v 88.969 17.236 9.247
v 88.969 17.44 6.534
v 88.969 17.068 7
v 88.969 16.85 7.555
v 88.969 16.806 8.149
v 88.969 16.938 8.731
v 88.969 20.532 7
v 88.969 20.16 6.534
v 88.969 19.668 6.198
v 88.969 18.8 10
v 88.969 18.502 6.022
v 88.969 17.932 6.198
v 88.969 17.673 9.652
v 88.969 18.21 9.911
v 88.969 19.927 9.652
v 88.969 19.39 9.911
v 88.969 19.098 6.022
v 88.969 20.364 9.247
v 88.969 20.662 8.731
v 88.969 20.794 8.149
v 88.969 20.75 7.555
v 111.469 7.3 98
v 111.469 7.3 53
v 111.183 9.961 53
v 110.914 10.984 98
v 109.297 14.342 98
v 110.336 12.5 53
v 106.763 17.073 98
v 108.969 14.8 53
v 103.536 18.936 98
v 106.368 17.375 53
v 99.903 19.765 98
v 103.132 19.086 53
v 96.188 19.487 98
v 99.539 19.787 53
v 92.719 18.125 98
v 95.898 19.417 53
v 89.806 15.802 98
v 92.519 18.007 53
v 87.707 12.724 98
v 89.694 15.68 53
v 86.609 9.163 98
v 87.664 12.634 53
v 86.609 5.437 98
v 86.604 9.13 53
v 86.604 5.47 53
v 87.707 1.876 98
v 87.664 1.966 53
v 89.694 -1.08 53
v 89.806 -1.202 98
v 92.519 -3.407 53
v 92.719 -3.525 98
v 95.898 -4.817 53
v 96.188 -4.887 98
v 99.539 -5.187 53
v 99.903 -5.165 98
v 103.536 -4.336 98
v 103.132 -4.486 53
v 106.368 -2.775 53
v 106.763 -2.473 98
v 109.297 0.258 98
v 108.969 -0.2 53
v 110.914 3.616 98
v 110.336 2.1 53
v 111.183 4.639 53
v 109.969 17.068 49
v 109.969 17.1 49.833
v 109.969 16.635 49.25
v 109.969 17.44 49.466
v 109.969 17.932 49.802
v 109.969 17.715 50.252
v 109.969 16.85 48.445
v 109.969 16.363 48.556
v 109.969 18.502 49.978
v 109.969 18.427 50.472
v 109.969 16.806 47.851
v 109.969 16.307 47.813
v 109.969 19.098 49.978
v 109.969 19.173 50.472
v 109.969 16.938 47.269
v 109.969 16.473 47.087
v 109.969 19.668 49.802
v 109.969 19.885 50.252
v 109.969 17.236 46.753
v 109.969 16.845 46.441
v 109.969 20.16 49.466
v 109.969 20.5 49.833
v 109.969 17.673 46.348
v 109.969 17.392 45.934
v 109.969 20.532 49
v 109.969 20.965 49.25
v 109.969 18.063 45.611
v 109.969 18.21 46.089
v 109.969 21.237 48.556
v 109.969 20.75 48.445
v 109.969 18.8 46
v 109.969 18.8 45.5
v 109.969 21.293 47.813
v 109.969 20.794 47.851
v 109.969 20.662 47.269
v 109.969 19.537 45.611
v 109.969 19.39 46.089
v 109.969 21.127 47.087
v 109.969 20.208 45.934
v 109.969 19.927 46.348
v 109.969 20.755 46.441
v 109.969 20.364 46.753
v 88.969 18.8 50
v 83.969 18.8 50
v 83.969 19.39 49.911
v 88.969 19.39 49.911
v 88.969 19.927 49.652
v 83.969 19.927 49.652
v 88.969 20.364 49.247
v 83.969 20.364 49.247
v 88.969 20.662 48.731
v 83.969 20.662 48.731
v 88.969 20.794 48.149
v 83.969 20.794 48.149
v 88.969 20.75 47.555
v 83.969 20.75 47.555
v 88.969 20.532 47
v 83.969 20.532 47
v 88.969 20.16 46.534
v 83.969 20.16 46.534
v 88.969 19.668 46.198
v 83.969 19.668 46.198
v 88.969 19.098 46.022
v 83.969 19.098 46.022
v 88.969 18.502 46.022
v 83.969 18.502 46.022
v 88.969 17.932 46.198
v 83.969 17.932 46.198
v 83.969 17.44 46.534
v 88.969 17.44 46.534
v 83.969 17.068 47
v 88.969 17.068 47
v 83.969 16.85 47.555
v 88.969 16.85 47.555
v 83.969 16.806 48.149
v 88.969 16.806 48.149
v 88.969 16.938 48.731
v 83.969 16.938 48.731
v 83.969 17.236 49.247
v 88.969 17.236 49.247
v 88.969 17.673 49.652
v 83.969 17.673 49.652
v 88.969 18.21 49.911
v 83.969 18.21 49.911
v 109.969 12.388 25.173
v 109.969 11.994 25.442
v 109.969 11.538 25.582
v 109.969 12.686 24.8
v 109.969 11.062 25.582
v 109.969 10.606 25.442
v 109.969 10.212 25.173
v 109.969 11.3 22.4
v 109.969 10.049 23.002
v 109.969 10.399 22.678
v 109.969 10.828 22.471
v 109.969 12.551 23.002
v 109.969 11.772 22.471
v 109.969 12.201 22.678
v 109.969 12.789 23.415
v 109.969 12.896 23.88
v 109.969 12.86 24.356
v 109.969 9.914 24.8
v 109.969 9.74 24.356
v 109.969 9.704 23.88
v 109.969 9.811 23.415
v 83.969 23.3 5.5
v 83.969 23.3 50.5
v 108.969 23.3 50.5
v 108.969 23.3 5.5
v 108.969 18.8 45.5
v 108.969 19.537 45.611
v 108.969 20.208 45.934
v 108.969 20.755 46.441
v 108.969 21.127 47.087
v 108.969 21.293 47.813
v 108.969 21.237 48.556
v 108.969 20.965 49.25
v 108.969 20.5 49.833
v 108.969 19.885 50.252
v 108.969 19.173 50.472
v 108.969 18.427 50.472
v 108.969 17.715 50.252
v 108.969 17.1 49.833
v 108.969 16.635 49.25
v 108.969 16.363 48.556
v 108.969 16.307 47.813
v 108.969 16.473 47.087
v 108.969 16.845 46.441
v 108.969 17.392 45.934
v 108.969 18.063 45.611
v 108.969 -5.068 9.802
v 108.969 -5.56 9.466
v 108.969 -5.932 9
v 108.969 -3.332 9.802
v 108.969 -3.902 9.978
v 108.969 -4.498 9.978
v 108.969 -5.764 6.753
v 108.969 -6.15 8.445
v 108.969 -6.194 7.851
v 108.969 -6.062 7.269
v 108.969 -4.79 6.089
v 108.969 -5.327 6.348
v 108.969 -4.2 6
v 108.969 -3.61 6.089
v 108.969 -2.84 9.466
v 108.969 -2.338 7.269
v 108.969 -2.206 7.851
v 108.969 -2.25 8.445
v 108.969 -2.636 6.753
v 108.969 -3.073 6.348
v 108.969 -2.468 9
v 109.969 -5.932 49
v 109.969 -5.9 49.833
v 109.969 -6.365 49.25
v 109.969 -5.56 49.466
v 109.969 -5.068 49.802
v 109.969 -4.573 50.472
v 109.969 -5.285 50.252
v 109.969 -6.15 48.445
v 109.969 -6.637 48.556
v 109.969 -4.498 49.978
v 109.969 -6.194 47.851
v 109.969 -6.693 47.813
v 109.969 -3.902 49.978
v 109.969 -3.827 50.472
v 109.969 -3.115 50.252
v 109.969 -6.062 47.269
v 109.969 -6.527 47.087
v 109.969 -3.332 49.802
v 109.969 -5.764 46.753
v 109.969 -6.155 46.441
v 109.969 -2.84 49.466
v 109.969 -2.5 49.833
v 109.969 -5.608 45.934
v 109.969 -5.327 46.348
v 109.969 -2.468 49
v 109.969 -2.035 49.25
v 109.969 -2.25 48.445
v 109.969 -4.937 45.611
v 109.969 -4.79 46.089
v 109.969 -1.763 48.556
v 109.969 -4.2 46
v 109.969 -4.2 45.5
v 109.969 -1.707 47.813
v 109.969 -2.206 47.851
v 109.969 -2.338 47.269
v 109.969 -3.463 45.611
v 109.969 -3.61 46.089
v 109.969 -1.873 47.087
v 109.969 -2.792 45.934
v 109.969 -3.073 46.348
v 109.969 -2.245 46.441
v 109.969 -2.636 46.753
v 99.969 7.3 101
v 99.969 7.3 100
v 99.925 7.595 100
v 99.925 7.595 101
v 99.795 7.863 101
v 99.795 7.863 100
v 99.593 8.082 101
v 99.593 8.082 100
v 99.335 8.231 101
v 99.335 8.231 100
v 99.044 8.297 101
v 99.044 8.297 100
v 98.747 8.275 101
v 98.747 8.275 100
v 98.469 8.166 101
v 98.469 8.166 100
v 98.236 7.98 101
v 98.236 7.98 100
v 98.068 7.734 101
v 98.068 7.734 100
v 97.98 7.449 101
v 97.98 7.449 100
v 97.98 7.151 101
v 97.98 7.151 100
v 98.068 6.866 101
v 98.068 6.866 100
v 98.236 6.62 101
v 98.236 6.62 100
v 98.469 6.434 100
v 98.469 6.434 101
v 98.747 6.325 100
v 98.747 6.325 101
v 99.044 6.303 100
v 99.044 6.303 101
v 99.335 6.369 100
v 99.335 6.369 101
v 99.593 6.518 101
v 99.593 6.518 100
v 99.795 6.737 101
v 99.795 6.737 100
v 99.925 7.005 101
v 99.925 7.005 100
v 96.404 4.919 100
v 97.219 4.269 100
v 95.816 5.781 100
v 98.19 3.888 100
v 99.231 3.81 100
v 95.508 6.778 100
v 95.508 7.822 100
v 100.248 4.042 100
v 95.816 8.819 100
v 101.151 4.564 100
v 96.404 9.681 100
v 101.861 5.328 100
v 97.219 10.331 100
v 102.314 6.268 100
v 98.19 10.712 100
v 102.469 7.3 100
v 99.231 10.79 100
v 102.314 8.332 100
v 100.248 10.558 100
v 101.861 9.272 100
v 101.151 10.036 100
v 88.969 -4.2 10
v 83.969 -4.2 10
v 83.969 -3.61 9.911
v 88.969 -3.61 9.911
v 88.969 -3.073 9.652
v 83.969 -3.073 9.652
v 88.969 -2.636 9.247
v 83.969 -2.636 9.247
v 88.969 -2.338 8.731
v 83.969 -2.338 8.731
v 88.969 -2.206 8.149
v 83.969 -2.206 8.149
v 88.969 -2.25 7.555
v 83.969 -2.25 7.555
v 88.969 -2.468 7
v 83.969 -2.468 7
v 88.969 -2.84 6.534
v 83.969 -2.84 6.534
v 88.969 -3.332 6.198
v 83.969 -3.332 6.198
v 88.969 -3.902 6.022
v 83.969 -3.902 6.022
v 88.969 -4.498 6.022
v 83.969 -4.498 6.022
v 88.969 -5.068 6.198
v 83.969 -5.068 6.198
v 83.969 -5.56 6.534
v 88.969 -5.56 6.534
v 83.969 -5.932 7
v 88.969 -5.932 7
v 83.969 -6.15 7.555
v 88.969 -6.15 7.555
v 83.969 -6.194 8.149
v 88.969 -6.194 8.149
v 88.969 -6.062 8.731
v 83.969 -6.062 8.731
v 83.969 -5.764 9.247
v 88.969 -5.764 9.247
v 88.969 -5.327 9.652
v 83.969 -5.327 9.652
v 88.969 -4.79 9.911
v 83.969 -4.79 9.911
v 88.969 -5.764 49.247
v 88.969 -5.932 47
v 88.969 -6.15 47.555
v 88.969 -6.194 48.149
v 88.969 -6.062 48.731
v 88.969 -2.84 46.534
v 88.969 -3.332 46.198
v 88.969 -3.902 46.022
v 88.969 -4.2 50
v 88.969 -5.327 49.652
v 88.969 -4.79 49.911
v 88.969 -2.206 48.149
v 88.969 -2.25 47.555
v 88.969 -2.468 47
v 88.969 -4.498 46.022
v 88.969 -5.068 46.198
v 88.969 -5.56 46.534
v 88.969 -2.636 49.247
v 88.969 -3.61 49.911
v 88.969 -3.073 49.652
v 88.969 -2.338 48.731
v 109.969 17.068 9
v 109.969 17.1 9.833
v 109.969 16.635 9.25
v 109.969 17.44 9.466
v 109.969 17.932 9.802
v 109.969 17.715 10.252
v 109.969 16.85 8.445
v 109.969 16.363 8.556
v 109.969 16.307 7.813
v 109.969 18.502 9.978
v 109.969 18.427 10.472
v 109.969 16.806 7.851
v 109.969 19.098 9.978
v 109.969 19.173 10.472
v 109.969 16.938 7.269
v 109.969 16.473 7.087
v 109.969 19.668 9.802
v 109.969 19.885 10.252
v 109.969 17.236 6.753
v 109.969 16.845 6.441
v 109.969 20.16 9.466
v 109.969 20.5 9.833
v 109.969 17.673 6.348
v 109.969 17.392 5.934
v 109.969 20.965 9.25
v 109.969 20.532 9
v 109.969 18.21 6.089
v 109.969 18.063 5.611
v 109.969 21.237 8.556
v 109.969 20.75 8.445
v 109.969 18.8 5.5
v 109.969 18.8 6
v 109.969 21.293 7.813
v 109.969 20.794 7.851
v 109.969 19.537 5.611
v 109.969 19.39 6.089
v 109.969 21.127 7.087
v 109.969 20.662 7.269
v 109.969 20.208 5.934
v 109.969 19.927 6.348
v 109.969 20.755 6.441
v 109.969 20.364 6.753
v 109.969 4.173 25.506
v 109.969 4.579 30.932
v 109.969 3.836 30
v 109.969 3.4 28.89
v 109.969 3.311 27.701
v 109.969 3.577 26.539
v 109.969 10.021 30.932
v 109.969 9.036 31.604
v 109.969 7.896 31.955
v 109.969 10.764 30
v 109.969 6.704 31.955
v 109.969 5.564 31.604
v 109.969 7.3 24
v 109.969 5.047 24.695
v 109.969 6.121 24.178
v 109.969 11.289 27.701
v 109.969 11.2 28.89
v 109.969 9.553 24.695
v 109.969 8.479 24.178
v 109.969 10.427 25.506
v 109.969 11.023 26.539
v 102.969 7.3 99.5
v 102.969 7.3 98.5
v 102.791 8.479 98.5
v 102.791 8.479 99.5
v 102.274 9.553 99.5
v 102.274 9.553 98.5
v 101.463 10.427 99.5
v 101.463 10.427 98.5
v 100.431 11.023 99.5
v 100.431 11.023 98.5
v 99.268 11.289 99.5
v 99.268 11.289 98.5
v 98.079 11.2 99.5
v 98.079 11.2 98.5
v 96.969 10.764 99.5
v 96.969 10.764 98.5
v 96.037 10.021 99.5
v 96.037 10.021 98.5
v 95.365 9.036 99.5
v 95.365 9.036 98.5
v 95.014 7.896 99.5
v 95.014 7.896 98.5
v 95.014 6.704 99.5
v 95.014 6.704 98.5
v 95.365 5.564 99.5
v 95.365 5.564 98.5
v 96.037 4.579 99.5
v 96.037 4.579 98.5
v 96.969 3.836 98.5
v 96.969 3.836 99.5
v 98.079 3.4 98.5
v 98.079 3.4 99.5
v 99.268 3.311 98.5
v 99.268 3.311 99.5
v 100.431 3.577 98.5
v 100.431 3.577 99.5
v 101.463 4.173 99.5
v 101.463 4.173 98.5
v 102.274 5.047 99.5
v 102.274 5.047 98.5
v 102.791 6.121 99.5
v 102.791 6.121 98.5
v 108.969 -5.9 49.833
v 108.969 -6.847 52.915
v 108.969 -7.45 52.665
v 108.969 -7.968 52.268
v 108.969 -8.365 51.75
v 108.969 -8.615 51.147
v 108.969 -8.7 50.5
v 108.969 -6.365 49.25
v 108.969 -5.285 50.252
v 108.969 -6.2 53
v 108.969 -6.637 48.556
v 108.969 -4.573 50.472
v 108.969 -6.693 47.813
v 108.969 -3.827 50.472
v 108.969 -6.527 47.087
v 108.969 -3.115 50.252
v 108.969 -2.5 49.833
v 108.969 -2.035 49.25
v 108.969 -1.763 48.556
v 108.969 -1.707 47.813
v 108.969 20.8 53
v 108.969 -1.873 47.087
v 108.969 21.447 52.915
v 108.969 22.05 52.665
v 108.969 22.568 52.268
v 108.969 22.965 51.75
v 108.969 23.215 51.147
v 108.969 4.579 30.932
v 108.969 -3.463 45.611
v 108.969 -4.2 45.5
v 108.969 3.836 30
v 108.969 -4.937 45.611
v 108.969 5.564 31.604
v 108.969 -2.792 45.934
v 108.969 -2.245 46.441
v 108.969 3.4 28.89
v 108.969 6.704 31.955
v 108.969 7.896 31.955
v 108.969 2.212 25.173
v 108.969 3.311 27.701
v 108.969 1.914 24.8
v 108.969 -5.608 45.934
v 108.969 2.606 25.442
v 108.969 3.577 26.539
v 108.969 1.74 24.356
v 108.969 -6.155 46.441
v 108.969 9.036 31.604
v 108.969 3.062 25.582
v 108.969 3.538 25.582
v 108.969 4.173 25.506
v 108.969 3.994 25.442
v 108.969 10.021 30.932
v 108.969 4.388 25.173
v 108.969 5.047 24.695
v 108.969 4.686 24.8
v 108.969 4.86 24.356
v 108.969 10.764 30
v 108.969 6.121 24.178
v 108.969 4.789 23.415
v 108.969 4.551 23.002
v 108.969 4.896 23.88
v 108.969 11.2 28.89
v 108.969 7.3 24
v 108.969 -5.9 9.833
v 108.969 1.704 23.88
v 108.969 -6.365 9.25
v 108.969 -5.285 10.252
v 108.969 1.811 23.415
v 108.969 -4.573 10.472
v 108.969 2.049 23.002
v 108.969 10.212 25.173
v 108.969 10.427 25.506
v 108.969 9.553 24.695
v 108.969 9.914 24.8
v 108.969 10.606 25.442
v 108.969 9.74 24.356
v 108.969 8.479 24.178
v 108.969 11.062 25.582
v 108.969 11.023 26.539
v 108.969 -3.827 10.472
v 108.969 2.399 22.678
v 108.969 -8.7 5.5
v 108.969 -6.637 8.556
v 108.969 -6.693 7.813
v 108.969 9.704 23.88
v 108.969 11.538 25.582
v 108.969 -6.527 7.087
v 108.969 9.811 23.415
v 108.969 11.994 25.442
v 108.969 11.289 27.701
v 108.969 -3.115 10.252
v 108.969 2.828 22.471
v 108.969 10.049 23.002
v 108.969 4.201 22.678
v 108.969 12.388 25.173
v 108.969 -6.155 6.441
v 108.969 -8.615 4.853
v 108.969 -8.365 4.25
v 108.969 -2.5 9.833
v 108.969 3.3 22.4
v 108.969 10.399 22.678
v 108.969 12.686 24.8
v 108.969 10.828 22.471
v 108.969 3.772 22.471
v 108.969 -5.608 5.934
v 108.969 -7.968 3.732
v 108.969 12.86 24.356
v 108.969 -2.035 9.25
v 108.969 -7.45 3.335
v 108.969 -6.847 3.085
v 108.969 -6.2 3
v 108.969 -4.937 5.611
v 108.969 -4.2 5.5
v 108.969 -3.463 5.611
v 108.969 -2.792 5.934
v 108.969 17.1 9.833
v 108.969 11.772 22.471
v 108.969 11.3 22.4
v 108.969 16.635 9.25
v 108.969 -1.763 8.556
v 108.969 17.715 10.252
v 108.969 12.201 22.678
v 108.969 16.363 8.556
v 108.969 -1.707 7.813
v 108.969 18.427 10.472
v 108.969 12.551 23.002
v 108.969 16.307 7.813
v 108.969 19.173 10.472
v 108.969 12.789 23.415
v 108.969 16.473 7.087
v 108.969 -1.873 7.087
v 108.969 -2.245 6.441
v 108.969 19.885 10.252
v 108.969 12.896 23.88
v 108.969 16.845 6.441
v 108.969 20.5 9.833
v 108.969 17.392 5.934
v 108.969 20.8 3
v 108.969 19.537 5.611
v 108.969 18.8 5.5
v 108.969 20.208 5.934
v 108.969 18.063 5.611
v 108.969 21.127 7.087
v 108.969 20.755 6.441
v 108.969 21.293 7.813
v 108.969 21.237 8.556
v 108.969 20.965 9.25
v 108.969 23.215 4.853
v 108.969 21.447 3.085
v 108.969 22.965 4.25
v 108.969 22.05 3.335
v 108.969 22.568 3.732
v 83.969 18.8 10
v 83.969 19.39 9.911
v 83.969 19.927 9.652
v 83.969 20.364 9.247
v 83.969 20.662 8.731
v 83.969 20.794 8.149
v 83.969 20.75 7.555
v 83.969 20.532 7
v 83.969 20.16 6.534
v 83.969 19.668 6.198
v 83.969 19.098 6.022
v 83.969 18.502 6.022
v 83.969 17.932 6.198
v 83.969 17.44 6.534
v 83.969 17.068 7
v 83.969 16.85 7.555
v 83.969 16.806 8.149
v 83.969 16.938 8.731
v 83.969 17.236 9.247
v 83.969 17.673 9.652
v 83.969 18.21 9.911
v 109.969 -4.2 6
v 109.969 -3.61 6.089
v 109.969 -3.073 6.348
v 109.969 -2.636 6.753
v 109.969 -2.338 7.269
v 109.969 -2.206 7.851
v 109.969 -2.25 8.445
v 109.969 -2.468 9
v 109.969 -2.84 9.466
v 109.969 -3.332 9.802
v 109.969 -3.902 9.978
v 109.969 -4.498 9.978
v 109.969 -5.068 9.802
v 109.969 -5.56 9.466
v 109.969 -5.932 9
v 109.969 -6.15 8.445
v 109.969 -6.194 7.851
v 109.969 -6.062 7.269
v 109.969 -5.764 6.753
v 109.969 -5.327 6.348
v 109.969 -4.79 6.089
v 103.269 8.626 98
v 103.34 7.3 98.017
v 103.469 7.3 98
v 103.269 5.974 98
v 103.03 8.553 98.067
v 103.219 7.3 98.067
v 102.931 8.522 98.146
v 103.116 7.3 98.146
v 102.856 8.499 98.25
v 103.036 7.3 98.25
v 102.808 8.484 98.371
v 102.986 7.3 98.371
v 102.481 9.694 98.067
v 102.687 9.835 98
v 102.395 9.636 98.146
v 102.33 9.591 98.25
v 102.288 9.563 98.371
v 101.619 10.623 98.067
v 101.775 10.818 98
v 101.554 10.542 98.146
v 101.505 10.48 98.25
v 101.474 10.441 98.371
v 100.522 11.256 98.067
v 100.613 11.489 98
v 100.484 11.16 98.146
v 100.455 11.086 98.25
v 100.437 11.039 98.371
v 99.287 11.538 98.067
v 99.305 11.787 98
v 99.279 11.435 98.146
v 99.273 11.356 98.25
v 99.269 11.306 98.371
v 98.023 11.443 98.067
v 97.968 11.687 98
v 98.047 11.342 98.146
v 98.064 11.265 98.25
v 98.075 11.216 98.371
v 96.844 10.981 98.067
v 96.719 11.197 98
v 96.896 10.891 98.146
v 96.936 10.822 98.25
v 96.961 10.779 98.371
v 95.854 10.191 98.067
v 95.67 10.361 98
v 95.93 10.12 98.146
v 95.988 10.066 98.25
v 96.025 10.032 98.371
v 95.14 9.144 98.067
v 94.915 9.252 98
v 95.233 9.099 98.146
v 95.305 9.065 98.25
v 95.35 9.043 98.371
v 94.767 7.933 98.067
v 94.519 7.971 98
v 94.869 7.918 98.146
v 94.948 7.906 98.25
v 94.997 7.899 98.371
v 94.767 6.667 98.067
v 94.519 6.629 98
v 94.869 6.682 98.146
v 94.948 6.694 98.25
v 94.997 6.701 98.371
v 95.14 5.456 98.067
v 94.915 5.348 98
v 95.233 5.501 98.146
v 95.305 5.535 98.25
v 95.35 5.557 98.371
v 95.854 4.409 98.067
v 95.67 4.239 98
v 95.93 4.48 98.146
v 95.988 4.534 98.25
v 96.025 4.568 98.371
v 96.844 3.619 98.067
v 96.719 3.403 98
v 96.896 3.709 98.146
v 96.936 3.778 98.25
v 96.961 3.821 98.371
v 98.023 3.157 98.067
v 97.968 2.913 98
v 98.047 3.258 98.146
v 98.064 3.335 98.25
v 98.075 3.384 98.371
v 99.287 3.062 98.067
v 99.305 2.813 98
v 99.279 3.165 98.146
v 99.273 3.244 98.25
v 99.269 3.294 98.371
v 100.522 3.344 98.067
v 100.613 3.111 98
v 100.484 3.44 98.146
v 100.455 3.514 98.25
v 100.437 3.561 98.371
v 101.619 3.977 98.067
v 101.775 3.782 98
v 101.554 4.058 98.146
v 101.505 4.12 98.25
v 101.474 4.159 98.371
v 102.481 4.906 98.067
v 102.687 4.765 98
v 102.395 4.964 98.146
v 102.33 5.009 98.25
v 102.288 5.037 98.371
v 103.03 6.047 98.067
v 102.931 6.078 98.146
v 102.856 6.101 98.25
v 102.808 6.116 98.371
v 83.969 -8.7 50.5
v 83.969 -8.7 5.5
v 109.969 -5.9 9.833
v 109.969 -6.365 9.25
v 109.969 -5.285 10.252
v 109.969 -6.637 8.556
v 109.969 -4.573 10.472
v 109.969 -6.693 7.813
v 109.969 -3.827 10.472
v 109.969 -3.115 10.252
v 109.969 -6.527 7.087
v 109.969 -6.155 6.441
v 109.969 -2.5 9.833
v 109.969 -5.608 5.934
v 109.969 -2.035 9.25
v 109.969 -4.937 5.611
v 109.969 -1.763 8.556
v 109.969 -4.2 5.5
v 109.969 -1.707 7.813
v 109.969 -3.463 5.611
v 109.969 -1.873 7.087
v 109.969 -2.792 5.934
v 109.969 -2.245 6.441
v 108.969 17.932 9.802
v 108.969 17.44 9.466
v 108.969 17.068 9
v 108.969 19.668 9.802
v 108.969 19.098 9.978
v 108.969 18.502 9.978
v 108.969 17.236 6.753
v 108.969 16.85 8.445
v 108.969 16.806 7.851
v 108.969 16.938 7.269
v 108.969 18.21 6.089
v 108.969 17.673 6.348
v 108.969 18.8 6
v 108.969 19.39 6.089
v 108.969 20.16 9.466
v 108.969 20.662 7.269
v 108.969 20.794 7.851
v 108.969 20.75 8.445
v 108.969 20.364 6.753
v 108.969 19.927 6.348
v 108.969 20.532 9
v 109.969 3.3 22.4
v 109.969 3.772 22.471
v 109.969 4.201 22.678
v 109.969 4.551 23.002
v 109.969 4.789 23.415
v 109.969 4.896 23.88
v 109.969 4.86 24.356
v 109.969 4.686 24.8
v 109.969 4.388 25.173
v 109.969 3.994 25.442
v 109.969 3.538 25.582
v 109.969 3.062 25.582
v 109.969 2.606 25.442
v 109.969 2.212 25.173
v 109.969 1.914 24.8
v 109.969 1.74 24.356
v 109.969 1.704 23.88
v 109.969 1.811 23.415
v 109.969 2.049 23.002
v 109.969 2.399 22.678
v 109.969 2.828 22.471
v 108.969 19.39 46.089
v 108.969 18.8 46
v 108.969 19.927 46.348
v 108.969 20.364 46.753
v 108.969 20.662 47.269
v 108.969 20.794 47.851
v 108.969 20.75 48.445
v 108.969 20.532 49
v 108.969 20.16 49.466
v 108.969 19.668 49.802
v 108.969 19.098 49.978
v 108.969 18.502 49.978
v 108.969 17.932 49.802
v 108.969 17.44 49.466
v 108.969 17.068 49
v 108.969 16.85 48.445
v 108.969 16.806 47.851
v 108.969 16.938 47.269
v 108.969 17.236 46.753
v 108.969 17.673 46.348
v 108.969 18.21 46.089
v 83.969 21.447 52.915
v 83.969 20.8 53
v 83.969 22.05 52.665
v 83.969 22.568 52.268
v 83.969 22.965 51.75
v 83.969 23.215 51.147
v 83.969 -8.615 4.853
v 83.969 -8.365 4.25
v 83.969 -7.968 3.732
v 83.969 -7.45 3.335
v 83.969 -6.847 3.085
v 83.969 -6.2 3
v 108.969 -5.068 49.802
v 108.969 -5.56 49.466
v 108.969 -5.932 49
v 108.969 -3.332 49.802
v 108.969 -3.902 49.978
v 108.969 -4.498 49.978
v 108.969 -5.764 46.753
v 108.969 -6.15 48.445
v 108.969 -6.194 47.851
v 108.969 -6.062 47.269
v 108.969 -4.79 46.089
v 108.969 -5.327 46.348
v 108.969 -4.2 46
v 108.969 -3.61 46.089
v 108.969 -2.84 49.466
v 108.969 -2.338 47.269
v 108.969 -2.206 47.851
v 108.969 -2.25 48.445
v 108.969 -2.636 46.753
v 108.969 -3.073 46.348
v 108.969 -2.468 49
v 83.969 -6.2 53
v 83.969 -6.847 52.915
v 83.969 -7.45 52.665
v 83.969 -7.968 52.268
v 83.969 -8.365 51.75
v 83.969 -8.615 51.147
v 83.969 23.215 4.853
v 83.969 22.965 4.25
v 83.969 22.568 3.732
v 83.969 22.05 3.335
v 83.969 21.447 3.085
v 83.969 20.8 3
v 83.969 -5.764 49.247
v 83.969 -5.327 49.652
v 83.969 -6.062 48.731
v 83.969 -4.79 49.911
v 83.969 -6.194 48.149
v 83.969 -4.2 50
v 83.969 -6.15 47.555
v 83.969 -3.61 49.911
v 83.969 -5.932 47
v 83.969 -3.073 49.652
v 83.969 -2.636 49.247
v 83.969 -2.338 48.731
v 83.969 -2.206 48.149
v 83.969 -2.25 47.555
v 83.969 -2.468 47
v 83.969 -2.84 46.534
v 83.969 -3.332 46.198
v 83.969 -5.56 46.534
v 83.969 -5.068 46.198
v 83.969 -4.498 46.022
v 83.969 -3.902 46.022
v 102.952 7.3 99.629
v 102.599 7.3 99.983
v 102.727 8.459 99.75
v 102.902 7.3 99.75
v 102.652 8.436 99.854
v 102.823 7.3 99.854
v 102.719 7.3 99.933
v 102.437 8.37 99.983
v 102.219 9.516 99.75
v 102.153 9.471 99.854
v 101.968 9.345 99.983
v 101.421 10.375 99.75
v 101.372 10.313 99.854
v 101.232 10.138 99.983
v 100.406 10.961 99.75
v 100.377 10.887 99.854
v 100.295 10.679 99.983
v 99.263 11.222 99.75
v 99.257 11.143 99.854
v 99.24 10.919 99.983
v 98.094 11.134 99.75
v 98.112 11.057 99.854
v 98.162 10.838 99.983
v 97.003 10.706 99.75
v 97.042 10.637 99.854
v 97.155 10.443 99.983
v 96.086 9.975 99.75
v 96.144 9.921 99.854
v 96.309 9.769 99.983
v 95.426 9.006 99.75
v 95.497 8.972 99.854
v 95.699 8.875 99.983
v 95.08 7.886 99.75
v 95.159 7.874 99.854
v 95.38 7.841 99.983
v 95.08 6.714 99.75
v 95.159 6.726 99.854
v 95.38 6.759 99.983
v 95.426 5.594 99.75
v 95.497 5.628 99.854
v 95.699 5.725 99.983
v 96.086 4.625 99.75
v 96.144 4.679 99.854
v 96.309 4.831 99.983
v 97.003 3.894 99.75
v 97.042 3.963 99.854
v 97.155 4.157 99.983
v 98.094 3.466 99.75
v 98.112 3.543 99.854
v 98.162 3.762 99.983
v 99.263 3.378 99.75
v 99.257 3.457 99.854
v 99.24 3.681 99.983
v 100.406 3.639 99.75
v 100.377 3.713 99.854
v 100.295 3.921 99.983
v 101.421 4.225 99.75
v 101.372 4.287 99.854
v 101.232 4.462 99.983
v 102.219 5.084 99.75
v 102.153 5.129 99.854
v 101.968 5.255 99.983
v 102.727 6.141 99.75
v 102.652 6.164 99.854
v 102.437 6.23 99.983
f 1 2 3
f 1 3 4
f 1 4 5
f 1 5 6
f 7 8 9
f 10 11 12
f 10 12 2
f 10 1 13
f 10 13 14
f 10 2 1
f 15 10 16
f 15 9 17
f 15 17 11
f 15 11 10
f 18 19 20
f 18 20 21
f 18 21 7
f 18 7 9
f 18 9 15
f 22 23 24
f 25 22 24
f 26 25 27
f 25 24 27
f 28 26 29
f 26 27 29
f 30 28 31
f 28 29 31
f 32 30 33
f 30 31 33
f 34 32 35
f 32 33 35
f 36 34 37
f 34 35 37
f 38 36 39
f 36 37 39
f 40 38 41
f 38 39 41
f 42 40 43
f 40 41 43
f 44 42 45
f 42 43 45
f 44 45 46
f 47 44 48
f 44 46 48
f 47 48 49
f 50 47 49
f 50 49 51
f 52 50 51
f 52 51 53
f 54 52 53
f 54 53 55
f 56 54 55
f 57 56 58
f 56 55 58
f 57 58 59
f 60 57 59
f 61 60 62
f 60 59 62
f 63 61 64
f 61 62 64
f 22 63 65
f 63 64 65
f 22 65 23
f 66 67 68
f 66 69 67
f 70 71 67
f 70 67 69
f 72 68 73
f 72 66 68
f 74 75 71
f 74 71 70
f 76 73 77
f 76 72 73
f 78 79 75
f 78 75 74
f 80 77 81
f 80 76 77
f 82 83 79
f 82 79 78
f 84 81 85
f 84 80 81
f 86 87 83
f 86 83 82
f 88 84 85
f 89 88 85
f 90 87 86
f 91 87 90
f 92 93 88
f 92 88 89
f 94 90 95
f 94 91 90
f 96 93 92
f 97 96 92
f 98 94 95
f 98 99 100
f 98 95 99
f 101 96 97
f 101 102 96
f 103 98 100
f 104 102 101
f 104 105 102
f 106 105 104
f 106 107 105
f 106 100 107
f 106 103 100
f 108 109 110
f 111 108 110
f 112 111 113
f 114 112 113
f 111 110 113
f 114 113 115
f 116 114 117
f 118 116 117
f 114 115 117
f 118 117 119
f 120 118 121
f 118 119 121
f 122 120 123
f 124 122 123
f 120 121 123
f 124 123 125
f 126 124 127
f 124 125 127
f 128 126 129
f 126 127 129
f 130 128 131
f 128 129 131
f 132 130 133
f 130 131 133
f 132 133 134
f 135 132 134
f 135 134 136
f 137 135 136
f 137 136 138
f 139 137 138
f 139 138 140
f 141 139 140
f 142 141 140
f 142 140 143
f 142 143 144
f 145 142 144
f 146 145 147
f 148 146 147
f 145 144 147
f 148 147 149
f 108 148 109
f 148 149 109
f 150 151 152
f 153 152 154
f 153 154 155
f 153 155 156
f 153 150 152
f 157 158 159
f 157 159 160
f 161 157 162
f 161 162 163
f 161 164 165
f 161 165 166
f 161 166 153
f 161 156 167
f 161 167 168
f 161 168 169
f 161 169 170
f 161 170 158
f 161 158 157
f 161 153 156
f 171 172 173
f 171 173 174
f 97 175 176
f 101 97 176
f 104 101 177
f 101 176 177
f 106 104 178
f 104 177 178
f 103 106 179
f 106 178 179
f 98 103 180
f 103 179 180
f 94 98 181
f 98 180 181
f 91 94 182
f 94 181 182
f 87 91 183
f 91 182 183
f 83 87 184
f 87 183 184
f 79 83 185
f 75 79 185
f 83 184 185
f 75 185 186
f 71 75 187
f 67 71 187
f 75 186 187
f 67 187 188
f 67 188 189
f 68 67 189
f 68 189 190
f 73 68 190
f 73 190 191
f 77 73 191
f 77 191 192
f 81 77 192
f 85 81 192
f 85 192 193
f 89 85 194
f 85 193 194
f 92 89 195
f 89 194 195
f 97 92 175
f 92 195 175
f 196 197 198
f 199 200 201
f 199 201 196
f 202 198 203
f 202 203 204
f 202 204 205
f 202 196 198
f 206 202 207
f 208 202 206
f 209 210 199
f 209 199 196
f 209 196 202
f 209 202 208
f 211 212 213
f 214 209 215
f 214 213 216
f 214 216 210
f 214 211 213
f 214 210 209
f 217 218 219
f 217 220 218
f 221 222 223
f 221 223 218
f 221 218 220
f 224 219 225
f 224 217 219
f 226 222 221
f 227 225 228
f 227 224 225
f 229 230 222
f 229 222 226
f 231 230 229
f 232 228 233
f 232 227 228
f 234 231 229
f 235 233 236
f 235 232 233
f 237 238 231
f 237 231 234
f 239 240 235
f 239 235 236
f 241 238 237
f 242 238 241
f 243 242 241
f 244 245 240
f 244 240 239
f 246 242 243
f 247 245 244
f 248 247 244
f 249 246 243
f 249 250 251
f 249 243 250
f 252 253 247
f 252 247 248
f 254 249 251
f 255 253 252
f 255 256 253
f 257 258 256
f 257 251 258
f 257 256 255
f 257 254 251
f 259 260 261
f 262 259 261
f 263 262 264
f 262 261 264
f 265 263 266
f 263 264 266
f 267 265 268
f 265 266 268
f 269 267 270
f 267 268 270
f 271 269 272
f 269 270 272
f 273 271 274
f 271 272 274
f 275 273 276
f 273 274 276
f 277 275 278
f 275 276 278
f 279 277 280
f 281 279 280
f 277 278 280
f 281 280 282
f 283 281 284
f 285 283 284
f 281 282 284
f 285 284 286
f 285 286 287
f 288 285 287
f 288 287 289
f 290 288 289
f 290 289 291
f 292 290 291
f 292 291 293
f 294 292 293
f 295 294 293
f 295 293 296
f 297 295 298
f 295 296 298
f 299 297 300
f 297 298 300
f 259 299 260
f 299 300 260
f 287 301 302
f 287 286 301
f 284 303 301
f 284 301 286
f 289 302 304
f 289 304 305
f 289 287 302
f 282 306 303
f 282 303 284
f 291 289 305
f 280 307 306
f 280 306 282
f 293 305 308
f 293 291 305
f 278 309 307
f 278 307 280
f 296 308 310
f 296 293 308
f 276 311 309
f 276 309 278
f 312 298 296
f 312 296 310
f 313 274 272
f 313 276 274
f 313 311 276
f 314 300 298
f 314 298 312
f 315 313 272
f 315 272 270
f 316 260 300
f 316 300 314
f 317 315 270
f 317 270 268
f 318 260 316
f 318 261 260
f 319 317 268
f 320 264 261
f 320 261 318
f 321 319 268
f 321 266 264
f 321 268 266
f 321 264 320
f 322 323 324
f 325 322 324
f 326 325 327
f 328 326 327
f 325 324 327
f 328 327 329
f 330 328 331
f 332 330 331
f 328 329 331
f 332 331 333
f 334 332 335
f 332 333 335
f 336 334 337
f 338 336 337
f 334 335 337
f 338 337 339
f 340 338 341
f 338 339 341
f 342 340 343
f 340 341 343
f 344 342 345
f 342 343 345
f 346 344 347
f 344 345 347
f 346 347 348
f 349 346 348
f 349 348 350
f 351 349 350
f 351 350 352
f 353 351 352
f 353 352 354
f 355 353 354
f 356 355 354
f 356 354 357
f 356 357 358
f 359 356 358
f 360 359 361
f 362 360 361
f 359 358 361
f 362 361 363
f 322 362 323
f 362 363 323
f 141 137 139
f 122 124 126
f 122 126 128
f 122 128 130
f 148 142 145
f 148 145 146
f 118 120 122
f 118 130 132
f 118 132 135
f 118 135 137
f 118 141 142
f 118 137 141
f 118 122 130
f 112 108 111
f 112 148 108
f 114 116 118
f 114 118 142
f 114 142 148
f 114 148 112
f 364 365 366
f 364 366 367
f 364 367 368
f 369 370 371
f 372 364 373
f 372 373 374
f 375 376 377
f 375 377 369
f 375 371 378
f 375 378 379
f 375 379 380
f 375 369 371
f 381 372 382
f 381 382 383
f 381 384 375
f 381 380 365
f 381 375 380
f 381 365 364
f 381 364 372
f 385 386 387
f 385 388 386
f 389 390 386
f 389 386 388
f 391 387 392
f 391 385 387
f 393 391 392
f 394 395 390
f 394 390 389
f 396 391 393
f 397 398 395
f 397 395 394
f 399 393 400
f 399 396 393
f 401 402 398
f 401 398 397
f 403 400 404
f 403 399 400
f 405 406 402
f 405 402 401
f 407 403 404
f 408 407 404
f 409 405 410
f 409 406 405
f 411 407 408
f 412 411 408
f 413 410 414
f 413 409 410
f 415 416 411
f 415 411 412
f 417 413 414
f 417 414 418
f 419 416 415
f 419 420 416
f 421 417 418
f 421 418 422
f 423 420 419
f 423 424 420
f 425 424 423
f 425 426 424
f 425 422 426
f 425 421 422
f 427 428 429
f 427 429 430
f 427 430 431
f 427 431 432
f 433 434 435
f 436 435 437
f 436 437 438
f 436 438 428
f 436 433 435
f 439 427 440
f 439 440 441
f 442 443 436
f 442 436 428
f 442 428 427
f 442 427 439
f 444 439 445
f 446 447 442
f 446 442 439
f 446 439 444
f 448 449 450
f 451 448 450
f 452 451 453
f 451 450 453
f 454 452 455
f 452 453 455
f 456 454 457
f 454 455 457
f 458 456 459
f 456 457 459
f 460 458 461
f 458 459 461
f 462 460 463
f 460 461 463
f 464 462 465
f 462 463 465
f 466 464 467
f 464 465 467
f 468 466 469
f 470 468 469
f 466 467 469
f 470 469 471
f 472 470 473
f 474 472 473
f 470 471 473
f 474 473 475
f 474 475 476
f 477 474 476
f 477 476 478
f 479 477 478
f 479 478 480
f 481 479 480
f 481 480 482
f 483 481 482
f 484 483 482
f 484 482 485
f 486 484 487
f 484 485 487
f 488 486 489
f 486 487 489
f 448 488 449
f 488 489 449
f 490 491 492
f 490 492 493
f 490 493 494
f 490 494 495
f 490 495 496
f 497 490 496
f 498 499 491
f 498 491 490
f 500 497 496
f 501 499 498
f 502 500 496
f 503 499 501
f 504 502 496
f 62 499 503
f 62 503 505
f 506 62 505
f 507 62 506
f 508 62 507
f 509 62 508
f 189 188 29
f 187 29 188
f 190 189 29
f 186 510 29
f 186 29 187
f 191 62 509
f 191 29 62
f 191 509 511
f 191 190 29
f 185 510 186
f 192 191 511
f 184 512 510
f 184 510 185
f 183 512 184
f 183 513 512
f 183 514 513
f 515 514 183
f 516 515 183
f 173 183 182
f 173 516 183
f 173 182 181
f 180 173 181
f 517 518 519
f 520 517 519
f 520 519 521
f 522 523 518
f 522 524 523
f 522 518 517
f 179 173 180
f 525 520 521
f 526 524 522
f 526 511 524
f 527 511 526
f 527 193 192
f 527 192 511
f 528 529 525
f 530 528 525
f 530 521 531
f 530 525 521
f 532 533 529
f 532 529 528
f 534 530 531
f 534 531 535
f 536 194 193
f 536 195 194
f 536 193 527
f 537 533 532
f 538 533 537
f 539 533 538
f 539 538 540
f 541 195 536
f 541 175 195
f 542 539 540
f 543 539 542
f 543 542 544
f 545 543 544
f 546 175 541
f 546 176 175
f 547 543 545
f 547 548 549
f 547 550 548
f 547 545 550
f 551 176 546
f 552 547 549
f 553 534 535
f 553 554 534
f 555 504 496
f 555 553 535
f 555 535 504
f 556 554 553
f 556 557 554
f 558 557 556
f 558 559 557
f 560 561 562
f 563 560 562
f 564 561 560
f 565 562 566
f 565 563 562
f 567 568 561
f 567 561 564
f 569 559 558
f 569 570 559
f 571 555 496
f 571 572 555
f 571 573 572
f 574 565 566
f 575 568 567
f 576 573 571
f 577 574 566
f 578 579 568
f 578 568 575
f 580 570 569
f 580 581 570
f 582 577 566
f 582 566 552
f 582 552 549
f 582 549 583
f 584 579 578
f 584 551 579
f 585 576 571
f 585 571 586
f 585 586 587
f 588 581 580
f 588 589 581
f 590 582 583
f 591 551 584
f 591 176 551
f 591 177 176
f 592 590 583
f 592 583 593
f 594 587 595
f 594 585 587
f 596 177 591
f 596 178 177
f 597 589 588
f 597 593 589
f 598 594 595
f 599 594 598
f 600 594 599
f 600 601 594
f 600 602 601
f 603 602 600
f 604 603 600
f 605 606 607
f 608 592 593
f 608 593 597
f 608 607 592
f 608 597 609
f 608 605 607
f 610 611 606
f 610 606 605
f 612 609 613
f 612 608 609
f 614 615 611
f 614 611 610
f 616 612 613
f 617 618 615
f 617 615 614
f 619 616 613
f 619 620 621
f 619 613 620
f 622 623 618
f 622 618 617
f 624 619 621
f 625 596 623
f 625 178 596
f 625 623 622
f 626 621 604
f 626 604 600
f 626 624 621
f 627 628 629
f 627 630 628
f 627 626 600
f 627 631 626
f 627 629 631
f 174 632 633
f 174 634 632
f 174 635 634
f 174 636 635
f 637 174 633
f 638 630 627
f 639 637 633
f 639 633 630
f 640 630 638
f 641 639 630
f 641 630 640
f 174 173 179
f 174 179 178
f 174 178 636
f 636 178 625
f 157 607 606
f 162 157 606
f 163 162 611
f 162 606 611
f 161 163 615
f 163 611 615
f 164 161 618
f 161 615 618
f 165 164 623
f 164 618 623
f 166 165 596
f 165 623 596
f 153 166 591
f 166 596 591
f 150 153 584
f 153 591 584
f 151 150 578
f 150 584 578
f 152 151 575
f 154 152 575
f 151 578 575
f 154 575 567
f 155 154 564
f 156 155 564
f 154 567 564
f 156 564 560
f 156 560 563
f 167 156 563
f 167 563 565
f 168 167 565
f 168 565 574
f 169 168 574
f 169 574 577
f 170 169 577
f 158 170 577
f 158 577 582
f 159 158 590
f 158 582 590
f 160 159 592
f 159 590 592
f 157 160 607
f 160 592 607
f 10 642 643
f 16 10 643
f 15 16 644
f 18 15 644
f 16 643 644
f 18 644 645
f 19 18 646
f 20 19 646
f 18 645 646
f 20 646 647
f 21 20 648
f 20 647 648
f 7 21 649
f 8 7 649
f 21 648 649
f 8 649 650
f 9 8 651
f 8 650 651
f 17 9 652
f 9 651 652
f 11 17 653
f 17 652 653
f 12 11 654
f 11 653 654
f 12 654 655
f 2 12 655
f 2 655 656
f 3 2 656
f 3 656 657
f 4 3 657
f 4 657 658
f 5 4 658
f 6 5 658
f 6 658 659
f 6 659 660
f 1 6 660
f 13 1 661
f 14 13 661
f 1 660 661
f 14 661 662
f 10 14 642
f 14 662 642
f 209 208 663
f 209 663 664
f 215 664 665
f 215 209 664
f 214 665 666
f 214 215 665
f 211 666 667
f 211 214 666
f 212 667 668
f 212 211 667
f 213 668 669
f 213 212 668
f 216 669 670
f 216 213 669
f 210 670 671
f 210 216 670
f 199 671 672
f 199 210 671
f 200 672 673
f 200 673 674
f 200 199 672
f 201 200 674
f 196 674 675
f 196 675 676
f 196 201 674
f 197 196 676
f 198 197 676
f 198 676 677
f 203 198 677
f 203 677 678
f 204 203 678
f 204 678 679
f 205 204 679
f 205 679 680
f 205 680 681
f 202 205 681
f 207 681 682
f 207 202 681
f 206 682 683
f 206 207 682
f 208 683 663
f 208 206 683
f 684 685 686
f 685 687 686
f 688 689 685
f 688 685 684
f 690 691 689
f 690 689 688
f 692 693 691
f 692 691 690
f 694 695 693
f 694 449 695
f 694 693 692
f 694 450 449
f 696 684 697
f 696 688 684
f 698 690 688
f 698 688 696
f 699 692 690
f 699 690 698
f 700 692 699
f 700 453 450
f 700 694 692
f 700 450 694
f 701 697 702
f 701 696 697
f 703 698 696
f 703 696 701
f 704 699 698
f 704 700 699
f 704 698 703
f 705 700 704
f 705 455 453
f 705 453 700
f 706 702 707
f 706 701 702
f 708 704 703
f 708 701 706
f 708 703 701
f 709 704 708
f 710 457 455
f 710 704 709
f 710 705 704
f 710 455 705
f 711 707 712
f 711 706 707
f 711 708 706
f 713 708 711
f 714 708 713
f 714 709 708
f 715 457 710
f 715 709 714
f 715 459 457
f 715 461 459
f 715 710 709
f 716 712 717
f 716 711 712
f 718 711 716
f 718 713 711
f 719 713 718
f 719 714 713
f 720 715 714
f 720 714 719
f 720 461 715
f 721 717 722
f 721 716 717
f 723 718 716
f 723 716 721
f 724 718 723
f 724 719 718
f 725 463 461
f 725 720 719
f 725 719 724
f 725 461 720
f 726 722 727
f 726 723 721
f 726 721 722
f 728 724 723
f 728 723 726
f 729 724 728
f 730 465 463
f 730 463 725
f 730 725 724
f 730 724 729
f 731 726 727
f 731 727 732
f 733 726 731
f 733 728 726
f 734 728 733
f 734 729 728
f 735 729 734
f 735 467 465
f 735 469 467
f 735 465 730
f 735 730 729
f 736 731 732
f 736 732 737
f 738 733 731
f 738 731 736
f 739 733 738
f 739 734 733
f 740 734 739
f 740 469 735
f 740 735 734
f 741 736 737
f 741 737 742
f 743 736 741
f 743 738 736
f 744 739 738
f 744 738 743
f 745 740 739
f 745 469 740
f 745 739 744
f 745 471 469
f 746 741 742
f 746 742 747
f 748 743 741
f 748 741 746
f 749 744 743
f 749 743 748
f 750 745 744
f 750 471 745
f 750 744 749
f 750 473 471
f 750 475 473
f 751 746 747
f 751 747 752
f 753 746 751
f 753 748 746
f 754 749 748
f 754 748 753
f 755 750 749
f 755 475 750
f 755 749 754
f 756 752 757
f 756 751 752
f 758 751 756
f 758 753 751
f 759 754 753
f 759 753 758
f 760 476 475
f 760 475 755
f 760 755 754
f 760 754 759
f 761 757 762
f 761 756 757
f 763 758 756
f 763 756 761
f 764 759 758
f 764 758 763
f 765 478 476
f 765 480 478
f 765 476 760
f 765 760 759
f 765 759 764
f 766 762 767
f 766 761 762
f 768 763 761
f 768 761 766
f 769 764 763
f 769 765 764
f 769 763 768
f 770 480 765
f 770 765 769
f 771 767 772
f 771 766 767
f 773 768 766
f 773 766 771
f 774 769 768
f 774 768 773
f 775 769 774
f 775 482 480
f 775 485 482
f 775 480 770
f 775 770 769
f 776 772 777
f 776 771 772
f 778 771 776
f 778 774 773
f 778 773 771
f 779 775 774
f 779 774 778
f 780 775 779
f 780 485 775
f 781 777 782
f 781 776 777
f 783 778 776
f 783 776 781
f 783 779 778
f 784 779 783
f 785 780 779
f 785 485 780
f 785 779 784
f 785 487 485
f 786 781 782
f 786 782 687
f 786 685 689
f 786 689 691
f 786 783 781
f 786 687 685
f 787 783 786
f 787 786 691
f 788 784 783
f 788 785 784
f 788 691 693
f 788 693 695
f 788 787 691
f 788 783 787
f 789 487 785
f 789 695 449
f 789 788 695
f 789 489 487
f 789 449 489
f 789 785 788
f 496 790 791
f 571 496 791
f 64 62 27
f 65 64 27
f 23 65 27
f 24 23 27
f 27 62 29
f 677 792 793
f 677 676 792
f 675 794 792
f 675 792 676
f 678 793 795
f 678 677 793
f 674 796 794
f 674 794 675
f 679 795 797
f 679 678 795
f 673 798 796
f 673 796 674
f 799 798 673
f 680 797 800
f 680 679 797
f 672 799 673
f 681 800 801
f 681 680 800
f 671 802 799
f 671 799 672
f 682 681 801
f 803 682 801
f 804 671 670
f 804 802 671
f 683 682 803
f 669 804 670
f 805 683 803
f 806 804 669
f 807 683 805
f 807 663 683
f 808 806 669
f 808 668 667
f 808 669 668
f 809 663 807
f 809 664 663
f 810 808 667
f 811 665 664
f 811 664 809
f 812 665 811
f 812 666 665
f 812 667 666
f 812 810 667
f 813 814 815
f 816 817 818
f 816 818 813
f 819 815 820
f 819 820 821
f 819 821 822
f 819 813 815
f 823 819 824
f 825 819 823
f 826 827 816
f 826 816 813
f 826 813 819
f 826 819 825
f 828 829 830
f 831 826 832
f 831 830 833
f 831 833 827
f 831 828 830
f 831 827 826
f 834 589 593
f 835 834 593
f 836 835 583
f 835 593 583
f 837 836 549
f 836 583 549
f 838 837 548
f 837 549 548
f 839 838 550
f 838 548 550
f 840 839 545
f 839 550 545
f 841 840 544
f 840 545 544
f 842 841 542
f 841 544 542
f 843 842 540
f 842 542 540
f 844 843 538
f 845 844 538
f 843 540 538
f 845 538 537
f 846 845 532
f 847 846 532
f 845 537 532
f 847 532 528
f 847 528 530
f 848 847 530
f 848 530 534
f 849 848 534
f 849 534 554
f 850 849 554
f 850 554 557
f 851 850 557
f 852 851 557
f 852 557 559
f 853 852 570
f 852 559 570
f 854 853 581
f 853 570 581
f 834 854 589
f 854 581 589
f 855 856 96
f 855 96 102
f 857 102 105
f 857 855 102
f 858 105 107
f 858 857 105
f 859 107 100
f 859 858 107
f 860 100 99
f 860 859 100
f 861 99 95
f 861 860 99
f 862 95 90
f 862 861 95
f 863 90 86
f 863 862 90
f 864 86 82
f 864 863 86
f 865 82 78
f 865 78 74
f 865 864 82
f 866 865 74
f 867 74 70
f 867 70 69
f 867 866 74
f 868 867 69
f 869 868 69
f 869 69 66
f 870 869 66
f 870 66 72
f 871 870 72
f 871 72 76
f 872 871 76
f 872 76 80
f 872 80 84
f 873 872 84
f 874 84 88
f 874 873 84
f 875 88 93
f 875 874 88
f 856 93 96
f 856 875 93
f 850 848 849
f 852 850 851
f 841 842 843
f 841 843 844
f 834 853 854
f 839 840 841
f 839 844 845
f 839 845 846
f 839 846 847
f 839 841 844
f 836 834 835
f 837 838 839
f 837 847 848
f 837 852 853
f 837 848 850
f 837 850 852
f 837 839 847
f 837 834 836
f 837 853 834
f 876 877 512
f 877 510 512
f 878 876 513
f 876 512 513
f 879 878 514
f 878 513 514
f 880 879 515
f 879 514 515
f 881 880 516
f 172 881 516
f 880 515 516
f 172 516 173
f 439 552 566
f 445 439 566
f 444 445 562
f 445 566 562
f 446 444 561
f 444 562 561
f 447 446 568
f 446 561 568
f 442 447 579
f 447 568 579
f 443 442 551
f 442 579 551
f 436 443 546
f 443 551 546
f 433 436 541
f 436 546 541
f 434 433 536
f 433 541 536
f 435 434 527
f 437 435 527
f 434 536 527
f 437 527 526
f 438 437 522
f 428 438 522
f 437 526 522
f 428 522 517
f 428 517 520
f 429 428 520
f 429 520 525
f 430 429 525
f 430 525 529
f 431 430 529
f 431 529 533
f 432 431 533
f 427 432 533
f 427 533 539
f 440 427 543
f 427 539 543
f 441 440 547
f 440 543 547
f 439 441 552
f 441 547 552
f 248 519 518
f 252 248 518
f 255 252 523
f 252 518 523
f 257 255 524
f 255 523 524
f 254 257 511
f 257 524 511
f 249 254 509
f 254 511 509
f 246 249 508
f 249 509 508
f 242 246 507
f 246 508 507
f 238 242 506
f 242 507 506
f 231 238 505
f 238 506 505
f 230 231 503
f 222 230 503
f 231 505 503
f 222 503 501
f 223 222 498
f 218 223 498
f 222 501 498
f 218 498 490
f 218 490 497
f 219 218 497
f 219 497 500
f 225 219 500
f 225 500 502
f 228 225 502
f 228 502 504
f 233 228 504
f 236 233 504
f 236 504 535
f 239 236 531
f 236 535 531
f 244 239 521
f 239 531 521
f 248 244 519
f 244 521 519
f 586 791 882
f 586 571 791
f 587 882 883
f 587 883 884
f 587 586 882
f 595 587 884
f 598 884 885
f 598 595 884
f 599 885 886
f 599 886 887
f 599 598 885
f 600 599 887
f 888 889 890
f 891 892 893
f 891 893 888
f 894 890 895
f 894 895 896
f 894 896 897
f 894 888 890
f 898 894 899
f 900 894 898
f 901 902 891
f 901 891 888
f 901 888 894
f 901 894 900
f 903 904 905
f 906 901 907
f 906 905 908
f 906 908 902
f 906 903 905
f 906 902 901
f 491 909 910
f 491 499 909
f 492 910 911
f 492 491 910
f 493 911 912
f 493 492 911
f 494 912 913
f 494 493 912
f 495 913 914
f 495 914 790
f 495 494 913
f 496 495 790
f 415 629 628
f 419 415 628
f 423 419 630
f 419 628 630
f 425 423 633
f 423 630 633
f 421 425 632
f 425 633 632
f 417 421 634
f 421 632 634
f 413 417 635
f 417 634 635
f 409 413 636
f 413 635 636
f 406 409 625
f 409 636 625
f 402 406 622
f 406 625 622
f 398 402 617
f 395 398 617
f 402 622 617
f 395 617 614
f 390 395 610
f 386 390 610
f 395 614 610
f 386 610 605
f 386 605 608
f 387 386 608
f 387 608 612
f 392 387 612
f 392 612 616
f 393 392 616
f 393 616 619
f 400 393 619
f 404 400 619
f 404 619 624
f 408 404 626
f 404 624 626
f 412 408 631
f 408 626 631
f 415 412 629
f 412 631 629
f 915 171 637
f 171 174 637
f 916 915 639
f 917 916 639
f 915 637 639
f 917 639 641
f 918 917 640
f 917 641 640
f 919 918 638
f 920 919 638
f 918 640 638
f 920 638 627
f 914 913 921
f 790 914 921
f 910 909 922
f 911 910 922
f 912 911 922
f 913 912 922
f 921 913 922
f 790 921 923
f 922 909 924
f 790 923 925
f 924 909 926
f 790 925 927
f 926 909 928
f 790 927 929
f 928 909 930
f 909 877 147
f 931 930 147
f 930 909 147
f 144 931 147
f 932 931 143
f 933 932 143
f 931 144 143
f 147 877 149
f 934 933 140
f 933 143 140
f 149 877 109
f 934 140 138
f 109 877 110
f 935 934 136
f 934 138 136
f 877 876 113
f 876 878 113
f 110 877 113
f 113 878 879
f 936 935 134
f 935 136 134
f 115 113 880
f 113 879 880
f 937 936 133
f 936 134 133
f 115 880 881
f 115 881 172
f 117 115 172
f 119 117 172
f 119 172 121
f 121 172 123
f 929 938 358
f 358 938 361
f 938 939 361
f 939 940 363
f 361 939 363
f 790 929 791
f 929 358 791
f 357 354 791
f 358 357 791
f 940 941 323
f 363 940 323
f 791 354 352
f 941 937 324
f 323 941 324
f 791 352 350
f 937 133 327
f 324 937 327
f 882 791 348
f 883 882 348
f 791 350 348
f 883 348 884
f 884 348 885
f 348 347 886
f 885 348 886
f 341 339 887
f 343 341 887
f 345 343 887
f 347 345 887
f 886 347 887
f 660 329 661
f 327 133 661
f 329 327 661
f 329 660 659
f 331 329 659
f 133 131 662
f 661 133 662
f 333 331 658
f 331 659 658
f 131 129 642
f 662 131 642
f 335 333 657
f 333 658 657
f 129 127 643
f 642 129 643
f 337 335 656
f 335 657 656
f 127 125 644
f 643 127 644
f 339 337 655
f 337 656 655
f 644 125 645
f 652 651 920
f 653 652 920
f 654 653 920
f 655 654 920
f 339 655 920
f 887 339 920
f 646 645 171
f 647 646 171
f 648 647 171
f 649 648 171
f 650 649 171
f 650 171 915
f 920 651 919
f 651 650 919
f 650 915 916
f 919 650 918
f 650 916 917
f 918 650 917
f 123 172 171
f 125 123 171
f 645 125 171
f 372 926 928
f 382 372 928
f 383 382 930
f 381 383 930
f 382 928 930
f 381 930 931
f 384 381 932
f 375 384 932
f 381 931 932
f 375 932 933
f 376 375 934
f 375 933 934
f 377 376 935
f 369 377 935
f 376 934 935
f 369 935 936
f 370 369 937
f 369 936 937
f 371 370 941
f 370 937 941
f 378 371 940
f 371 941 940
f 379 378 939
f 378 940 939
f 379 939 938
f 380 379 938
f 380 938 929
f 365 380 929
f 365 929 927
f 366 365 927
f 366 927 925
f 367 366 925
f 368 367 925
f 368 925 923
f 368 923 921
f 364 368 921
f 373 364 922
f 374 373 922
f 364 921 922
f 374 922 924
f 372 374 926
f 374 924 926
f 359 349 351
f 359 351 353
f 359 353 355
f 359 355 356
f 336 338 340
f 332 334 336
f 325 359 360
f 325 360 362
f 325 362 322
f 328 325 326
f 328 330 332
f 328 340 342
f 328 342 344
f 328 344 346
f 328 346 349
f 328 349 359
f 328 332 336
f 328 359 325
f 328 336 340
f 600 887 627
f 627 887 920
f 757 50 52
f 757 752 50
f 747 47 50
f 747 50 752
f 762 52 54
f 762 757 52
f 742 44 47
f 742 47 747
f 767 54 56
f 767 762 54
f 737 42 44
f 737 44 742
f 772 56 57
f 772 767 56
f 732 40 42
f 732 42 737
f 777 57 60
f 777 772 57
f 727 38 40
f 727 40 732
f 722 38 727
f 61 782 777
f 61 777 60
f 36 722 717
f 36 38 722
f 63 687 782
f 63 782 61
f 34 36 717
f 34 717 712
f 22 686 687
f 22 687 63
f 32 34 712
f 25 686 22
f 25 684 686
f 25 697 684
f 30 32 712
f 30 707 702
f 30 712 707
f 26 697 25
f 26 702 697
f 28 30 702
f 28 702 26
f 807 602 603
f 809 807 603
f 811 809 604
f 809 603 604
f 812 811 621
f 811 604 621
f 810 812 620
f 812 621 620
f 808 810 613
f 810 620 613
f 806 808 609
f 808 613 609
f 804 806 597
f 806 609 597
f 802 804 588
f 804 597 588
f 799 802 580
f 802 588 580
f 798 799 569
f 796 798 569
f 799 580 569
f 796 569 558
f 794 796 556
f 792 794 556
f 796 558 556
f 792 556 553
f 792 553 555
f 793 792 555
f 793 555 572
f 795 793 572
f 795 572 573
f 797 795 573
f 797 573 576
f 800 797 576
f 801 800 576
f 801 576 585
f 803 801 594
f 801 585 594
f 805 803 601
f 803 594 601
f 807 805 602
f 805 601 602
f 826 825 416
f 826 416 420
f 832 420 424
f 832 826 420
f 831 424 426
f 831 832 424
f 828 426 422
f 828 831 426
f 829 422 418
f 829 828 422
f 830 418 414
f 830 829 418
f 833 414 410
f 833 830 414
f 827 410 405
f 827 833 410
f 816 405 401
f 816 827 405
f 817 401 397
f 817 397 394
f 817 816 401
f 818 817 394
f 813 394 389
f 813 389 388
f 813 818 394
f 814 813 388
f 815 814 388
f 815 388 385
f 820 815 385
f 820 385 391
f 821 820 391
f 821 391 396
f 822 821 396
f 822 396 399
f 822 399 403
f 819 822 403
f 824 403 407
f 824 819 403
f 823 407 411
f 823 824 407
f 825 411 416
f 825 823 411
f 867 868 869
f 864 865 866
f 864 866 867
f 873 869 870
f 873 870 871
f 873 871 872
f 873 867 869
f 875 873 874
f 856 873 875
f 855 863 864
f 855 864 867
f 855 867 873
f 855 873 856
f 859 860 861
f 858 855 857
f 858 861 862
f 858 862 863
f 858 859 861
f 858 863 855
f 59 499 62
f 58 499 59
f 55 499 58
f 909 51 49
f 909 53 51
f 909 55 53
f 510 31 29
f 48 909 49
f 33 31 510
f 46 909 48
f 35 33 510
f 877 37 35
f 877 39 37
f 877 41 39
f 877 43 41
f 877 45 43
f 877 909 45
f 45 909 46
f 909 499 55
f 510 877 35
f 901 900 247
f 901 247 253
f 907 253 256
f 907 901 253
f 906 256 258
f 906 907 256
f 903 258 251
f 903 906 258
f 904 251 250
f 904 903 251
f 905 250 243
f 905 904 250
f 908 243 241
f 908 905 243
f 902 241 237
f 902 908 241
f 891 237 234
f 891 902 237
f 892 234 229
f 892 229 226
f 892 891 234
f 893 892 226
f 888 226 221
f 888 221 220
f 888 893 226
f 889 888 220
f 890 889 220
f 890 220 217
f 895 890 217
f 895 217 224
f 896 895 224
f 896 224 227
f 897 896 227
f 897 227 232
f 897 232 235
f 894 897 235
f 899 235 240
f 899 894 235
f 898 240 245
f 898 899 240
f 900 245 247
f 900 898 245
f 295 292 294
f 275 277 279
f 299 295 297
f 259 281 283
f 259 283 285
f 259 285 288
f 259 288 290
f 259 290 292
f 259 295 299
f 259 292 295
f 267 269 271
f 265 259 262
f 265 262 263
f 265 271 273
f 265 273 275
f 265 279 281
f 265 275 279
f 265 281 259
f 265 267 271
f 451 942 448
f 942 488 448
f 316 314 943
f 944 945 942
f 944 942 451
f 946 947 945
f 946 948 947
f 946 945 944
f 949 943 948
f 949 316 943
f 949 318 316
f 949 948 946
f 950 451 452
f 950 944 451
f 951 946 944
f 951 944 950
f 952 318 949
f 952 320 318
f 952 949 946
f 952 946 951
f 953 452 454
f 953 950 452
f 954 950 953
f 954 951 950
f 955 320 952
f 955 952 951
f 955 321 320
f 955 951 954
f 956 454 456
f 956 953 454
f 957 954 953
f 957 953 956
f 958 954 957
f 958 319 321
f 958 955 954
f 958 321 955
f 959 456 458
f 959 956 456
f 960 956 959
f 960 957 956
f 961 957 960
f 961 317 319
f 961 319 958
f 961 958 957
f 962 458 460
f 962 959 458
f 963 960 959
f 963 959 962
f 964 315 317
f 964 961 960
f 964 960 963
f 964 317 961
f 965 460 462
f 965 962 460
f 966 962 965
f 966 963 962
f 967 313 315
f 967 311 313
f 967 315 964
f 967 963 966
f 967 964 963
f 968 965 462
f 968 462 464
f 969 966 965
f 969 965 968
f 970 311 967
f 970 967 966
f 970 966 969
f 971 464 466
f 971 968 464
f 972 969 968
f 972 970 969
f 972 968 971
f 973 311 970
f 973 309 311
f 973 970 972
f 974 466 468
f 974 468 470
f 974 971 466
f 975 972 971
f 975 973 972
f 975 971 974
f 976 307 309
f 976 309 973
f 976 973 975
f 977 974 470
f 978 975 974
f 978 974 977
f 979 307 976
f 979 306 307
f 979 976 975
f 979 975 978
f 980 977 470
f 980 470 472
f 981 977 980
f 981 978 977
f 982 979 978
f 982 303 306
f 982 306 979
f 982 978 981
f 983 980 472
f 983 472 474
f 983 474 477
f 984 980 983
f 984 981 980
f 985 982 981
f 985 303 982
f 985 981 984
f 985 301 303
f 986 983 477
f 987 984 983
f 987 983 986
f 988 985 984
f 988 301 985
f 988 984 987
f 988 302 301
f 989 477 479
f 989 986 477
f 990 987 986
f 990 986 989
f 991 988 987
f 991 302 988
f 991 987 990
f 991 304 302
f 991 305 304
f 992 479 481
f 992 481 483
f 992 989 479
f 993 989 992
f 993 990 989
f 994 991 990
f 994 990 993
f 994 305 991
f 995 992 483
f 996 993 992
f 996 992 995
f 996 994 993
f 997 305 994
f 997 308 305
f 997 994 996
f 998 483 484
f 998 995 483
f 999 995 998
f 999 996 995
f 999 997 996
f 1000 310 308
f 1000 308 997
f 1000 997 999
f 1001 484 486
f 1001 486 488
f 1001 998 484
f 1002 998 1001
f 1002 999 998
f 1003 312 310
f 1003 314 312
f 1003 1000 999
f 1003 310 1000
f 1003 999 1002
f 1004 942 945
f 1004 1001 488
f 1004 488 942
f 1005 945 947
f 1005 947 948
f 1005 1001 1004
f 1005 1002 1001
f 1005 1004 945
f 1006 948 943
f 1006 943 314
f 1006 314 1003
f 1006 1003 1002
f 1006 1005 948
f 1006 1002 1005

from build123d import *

# Parameters (mm, degrees)
SKETCH4_W           = 50
SKETCH4_H           = 32
BOSS_EXTRUDE1_DEPTH = 25
SKETCH5_R           = 2
CUT_EXTRUDE1_DEPTH  = 5
SKETCH2_R           = 2.5
SKETCH2_R_2         = 2
BOSS_EXTRUDE2_DEPTH = 1
SKETCH7_R           = 4
SKETCH7_R_2         = 1.6
BOSS_EXTRUDE3_DEPTH = 1
FILLET1_R           = 2.5
SKETCH8_R           = 12.5
BOSS_EXTRUDE4_DEPTH = 45
SKETCH10_R          = 4
BOSS_EXTRUDE5_DEPTH = 2
SKETCH11_R          = 1
BOSS_EXTRUDE6_DEPTH = 1
FILLET2_R           = 0.5


with BuildPart() as part:
    # Sketch4 → Boss-Extrude1 (new body)
    with BuildSketch(Plane(origin=(83.969208633, 0, 0), x_dir=(0, 0, -1), z_dir=(1, 0, 0))):
        with Locations((-28, 7.3)):
            Rectangle(SKETCH4_W, SKETCH4_H)
    extrude(amount=BOSS_EXTRUDE1_DEPTH)

    # Sketch5 → Cut-Extrude1 (cut)
    with BuildSketch(Plane.ZY.offset(-83.969208633)):
        with Locations((8, 18.8)):
            Circle(SKETCH5_R)
        with Locations((48, 18.8)):
            Circle(SKETCH5_R)
        with Locations((48, -4.2)):
            Circle(SKETCH5_R)
        with Locations((8, -4.2)):
            Circle(SKETCH5_R)
    extrude(amount=-CUT_EXTRUDE1_DEPTH, mode=Mode.SUBTRACT)

    # Sketch2 → Boss-Extrude2 (add)
    with BuildSketch(Plane(origin=(108.969208633, 0, 0), x_dir=(0, 0, -1), z_dir=(1, 0, 0))):
        with Locations((-48, 18.8)):
            Circle(SKETCH2_R)
        with Locations((-48, 18.8)):
            Circle(SKETCH2_R_2, mode=Mode.SUBTRACT)
        with Locations((-8, 18.8)):
            Circle(SKETCH2_R)
        with Locations((-8, 18.8)):
            Circle(SKETCH2_R_2, mode=Mode.SUBTRACT)
        with Locations((-8, -4.2)):
            Circle(SKETCH2_R)
        with Locations((-8, -4.2)):
            Circle(SKETCH2_R_2, mode=Mode.SUBTRACT)
        with Locations((-48, -4.2)):
            Circle(SKETCH2_R)
        with Locations((-48, -4.2)):
            Circle(SKETCH2_R_2, mode=Mode.SUBTRACT)
    extrude(amount=BOSS_EXTRUDE2_DEPTH)

    # Sketch7 → Boss-Extrude3 (add)
    with BuildSketch(Plane(origin=(108.969208633, 0, 0), x_dir=(0, 0, -1), z_dir=(1, 0, 0))):
        with Locations((-28, 7.3)):
            Circle(SKETCH7_R)
        with Locations((-24, 11.3)):
            Circle(SKETCH7_R_2)
        with Locations((-24, 3.3)):
            Circle(SKETCH7_R_2)
    extrude(amount=BOSS_EXTRUDE3_DEPTH)

    # Fillet1
    fillet1_edges = [part.edges().sort_by_distance(p)[0] for p in [
        (96.469208633, 23.3, 53),
        (96.469208633, 23.3, 3),
        (96.469208633, -8.7, 3),
        (96.469208633, -8.7, 53),
    ]]
    fillet(fillet1_edges, radius=FILLET1_R)

    # Sketch8 → Boss-Extrude4 (add)
    with BuildSketch(Plane.XY.offset(53)):
        with Locations((98.969208633, 7.3)):
            Circle(SKETCH8_R)
    extrude(amount=BOSS_EXTRUDE4_DEPTH)

    # Sketch10 → Boss-Extrude5 (add)
    with BuildSketch(Plane.XY.offset(98)):
        with Locations((98.969208633, 7.3)):
            Circle(SKETCH10_R)
    extrude(amount=BOSS_EXTRUDE5_DEPTH)

    # Sketch11 → Boss-Extrude6 (add)
    with BuildSketch(Plane.XY.offset(100)):
        with Locations((98.969208633, 7.3)):
            Circle(SKETCH11_R)
    extrude(amount=BOSS_EXTRUDE6_DEPTH)

    # Fillet2
    fillet2_edges = [part.edges().sort_by_distance(p)[0] for p in [
        (94.969208633, 7.3, 98),
        (94.969208633, 7.3, 100),
    ]]
    fillet(fillet2_edges, radius=FILLET2_R)


solid = part.part
